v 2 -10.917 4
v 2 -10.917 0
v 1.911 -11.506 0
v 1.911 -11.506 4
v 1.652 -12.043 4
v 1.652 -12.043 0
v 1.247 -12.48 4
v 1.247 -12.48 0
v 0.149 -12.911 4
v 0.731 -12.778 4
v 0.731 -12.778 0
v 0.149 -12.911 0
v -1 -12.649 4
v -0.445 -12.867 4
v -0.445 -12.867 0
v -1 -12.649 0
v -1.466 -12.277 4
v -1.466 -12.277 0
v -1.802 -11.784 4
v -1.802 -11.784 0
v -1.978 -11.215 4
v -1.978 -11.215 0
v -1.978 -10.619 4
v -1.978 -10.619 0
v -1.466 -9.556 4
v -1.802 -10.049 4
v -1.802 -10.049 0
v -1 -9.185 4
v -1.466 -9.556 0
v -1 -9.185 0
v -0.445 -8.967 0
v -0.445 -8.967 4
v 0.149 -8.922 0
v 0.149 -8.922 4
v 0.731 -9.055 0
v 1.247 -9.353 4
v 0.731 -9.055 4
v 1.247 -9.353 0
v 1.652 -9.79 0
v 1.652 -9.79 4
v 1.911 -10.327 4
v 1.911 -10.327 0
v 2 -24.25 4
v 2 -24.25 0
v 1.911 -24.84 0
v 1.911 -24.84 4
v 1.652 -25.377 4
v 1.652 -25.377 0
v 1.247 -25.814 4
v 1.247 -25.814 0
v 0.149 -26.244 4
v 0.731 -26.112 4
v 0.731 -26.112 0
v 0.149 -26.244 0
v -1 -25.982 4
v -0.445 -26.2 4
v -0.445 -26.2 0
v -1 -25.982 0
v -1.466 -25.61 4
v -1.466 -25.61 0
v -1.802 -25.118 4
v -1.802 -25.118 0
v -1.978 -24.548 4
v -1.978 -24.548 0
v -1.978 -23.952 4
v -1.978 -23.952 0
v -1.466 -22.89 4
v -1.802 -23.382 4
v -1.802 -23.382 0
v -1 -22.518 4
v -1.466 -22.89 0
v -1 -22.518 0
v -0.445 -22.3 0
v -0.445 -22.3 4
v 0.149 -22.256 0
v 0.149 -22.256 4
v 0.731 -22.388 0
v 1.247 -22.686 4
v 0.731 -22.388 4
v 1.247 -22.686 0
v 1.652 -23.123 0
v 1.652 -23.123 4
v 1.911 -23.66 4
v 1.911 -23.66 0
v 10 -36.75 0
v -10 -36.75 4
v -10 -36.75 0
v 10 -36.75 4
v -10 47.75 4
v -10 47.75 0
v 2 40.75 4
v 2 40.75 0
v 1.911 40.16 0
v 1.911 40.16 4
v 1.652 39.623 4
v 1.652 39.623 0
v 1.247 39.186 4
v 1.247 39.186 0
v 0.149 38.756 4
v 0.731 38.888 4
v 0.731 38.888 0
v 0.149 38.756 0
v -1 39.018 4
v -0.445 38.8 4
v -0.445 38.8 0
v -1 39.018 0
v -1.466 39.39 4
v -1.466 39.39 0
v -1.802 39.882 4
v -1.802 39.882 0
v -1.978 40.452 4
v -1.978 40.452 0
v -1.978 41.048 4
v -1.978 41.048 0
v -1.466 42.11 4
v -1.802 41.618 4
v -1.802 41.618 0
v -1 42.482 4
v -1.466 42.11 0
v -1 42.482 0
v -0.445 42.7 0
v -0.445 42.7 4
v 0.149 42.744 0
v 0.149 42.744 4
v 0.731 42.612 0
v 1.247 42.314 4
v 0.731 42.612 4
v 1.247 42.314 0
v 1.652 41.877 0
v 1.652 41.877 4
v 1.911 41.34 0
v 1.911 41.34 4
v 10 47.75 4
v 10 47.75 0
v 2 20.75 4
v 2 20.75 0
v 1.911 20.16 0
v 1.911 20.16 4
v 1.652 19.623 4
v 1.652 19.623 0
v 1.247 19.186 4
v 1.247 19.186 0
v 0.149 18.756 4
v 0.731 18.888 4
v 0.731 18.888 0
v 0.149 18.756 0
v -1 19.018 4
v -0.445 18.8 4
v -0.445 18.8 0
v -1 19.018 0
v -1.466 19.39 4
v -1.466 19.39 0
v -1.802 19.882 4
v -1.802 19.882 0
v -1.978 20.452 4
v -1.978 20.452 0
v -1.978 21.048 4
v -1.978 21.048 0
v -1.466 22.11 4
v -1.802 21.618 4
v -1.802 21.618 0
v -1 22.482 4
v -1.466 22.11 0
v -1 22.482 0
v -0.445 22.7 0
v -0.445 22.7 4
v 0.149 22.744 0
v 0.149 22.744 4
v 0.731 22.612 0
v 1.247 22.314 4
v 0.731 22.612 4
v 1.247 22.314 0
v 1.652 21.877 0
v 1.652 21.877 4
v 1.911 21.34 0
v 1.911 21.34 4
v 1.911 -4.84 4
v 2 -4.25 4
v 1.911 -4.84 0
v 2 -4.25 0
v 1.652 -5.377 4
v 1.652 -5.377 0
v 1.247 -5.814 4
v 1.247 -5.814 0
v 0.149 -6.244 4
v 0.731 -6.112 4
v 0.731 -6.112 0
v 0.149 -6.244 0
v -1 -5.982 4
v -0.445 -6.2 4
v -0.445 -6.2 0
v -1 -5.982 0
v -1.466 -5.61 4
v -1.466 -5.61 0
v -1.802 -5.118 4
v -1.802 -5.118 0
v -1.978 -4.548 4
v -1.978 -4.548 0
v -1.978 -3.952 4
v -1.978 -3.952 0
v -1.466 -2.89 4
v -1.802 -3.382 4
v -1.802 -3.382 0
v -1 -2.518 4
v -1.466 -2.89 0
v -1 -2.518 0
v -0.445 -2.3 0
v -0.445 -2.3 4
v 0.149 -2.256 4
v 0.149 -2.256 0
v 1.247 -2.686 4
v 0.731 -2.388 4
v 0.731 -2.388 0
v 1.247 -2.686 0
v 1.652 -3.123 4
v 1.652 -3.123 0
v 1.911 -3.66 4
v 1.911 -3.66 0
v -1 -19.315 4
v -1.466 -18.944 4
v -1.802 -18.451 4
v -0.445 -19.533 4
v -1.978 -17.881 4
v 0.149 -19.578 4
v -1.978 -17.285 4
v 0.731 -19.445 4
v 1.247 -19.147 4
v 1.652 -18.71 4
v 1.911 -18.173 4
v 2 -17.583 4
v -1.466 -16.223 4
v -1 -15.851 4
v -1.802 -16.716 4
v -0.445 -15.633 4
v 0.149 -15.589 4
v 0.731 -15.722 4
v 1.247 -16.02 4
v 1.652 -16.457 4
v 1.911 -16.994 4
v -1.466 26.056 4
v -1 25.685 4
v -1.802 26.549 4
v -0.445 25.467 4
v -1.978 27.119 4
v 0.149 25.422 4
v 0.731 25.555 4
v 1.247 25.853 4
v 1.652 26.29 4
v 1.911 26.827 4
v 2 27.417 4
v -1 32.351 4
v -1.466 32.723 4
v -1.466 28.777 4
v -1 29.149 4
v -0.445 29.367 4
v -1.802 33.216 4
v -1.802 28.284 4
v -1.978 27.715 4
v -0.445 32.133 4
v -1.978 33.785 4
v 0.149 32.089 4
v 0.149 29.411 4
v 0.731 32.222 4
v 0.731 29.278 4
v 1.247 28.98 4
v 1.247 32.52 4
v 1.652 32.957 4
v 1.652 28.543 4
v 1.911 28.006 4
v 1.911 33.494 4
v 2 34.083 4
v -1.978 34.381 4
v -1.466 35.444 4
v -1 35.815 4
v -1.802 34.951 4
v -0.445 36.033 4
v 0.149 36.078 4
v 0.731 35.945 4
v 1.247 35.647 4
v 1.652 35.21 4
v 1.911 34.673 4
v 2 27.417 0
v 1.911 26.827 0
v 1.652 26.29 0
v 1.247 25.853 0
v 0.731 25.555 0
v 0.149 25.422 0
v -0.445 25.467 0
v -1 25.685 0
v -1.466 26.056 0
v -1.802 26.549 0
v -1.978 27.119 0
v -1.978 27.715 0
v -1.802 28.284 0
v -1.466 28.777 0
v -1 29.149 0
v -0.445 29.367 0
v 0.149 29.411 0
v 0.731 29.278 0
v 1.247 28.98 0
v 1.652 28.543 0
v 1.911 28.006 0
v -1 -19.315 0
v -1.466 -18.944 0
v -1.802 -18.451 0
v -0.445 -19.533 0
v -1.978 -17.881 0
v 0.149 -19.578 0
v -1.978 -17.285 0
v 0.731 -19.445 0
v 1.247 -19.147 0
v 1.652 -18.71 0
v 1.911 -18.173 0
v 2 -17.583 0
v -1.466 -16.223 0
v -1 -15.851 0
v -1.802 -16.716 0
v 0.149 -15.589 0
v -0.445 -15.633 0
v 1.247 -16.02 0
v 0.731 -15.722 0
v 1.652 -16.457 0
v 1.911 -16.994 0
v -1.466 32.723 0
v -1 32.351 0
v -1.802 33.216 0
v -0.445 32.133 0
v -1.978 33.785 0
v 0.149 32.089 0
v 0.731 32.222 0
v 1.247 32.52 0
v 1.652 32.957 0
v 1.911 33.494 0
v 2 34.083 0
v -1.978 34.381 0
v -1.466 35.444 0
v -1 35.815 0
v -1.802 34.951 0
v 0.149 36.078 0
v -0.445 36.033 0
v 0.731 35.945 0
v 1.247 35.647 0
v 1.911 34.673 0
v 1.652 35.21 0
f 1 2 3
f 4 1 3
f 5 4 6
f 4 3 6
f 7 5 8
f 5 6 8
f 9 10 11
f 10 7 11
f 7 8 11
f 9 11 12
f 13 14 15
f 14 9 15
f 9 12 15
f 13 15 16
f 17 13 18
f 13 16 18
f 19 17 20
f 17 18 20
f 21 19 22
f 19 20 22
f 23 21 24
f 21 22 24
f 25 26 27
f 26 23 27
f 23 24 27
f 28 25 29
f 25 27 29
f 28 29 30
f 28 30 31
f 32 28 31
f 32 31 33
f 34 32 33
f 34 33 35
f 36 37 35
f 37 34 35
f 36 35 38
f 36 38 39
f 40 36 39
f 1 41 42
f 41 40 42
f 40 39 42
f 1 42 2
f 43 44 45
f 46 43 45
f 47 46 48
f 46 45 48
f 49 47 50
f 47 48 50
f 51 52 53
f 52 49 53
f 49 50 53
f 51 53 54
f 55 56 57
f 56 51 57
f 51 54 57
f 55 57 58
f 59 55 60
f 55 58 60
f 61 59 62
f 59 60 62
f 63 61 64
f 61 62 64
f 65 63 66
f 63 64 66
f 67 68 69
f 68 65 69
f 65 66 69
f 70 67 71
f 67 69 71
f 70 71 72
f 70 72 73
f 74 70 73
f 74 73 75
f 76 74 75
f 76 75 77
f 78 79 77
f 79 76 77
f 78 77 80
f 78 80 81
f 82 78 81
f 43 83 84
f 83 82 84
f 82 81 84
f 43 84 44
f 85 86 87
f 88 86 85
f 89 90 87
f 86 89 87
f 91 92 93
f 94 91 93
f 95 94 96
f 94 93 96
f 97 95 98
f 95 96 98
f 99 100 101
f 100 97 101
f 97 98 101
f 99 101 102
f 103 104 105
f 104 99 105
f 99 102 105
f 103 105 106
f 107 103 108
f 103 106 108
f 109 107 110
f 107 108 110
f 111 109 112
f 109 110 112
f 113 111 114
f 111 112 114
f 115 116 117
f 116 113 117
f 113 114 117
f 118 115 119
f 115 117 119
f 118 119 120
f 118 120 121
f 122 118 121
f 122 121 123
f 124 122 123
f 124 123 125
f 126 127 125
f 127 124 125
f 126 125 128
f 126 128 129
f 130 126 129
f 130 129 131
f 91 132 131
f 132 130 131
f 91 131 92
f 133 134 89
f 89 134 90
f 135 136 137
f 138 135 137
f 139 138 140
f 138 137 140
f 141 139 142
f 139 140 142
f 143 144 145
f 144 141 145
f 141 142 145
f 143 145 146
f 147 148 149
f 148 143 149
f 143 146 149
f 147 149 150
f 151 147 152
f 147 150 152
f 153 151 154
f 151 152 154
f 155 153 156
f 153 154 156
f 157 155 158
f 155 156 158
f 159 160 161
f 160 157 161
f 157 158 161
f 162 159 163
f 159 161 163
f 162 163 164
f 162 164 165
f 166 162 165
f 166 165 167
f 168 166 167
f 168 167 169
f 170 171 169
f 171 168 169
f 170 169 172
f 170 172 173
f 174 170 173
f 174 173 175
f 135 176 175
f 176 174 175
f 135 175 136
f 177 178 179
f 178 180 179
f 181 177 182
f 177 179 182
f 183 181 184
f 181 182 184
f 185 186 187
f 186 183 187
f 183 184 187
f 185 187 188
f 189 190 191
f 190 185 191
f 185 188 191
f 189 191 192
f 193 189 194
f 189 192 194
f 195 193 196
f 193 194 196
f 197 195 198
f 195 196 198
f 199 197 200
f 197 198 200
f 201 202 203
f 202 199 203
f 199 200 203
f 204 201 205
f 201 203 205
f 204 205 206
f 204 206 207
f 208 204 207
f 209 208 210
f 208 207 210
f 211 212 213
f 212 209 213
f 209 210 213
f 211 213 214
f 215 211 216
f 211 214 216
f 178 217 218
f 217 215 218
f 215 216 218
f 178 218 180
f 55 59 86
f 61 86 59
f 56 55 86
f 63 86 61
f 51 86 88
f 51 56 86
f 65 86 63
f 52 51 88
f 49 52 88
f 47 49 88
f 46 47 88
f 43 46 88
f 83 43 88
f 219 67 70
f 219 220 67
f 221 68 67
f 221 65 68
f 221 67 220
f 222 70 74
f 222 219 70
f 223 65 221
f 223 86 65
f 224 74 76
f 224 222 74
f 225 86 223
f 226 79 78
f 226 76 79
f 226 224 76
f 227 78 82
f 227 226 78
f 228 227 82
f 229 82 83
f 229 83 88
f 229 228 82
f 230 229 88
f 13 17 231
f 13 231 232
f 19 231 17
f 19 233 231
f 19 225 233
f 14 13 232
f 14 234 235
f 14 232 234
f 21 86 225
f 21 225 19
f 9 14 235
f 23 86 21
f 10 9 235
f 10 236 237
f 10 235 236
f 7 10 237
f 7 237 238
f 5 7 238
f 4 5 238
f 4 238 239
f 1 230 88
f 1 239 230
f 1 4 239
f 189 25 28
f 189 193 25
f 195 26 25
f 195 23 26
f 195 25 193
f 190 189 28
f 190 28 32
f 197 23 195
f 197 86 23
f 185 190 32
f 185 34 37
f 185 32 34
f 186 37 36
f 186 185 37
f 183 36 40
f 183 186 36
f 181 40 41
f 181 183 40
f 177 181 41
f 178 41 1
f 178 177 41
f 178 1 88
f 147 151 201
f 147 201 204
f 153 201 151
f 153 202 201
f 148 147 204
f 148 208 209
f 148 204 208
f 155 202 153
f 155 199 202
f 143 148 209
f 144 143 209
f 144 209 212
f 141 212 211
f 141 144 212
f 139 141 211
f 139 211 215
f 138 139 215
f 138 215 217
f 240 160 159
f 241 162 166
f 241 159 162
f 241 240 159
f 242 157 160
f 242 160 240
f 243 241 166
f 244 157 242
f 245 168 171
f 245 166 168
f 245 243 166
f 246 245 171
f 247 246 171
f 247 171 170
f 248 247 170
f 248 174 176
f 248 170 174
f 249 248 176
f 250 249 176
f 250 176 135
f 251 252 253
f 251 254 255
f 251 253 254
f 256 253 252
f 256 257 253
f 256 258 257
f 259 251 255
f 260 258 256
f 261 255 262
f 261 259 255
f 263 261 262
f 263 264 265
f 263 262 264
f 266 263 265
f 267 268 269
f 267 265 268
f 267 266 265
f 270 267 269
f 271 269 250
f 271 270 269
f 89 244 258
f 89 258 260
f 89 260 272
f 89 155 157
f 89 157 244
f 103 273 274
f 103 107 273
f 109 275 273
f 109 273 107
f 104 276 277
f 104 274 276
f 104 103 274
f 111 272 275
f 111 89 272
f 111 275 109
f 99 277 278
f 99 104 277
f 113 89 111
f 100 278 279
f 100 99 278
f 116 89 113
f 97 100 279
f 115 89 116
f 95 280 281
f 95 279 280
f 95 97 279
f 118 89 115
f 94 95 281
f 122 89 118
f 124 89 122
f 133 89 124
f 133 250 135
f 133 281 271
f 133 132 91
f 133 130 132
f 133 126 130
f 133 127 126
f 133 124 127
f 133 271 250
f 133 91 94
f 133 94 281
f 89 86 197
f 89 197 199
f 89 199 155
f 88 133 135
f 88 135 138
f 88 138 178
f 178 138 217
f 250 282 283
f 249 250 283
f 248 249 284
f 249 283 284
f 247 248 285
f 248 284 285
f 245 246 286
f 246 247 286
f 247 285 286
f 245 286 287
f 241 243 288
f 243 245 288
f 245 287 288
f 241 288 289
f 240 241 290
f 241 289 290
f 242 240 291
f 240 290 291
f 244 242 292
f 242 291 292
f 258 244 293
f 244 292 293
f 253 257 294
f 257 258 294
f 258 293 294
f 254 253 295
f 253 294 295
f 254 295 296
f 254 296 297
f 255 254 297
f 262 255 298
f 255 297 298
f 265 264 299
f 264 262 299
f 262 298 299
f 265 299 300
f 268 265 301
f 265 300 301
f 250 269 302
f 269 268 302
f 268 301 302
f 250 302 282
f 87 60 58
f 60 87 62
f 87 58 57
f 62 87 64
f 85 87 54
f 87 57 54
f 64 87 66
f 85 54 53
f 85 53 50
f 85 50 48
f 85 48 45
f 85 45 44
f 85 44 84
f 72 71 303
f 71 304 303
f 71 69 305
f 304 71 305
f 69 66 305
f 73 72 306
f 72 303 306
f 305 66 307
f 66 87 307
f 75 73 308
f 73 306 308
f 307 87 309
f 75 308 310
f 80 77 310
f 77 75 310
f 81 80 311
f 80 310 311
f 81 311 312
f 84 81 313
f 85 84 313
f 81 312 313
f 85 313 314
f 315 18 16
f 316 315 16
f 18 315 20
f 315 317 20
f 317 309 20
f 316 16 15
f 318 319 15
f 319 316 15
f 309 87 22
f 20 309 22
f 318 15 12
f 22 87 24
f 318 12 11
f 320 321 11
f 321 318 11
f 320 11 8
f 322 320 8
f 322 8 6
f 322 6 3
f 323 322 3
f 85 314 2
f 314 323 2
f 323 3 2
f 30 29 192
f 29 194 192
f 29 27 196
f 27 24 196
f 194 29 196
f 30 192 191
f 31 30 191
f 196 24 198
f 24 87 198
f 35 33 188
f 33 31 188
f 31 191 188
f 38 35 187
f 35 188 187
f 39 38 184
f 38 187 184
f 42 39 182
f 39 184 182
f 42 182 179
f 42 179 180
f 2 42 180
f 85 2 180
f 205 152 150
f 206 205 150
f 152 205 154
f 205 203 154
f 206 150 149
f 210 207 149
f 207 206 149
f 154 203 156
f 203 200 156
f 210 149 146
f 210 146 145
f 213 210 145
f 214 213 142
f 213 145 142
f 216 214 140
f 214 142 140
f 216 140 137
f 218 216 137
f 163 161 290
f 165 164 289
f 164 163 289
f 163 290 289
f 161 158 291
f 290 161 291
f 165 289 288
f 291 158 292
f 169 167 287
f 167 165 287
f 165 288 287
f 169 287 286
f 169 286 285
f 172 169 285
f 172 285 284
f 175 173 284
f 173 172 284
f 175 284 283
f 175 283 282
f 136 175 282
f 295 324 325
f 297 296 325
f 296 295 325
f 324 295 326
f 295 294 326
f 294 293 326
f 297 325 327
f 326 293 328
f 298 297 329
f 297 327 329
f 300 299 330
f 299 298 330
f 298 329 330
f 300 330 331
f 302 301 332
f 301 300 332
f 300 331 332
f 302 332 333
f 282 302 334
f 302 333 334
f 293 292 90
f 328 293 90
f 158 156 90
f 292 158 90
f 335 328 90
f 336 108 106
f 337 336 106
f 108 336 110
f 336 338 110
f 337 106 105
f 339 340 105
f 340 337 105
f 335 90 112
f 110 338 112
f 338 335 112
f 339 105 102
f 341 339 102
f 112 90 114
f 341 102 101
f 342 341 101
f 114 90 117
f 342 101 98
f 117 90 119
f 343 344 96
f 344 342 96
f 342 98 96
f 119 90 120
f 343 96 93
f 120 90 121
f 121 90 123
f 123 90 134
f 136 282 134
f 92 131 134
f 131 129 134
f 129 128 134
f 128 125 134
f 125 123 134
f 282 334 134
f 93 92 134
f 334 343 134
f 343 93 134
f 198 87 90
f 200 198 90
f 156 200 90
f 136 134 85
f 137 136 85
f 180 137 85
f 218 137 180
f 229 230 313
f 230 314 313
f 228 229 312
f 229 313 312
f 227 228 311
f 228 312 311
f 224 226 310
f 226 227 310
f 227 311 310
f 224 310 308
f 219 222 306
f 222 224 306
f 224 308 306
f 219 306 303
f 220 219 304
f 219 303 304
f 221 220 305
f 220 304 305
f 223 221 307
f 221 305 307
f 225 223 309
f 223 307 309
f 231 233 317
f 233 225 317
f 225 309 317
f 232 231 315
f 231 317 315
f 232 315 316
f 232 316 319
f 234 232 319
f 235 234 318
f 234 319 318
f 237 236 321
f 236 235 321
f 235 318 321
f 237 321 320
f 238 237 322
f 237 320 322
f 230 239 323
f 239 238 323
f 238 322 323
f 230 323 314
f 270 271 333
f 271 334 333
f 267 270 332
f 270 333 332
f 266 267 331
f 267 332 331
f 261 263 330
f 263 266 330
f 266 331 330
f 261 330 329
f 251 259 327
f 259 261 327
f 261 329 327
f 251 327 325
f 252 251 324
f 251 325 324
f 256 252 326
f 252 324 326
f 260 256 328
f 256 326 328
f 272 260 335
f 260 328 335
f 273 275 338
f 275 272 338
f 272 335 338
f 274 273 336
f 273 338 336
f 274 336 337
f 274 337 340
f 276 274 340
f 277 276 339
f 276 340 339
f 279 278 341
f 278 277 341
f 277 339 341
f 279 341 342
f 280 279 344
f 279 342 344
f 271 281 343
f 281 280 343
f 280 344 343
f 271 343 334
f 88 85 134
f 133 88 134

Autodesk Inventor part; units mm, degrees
ref_plane "YZ Plane" through (0, 0, 0) normal (1, 0, 0) x (0, 1, 0)
ref_plane "XZ Plane" through (0, 0, 0) normal (0, 1, 0) x (-1, 0, 0)
ref_plane "XY Plane" through (0, 0, 0) normal (0, 0, 1) x (1, 0, 0)
sketch "Sketch1" plane through (0, 0, 0) normal (0, 0, 1) x (1, 0, 0)
  circle A0 centre (0, -30.375) radius 0.875
  line L0 (10, -63.625) -> (10, 47.75)
  line L1 (10, 47.75) -> (-10, 47.75)
  line L2 (-10, 47.75) -> (-10, -63.625)
  line L3 (-10, -63.625) -> (10, -63.625)
  line L4 (6.125, -36.75) -> (6.125, -59.75)
  line L5 (6.125, -59.75) -> (-6.125, -59.75)
  line L6 (-6.125, -59.75) -> (-6.125, -36.75)
  line L7 (-6.125, -36.75) -> (6.125, -36.75)
  circle A1 centre (0, 40.75) radius 2
  circle A2 centre (0, -4.25) radius 2
  circle A3 centre (0, 20.75) radius 2
  circle A4 centre (0, -24.25) radius 2
  circle A5 centre (0, 34.0833) radius 2
  circle A6 centre (0, 27.4167) radius 2
  circle A7 centre (0, -10.9167) radius 2
  circle A8 centre (0, -17.5833) radius 2
  point P0 (0, 0)
  point P1 (0, 0)
extrude "Extrusion1" add sketch "Sketch1" along normal blind 4
sketch "Sketch2" plane through (0, 0, 4) normal (0, 0, 1) x (1, 0, 0)
  line L0 (6.125, -59.75) -> (-6.125, -59.75) projected
  line L1 (-6.125, -59.75) -> (-6.125, -36.75) projected
  line L2 (-6.125, -36.75) -> (6.125, -36.75) projected
  line L3 (6.125, -36.75) -> (6.125, -59.75) projected
  circle A0 centre (0, -17.5833) radius 2 projected
  circle A1 centre (0, -10.9167) radius 2 projected
  circle A2 centre (0, 27.4167) radius 2 projected
  circle A3 centre (0, 34.0833) radius 2 projected
  circle A4 centre (0, -24.25) radius 2 projected
  circle A5 centre (0, 20.75) radius 2 projected
  circle A6 centre (0, -4.25) radius 2 projected
  circle A7 centre (0, 40.75) radius 2 projected
  circle A8 centre (0, -30.375) radius 0.875 projected
  line L4 (10, -63.625) -> (10, 47.75) projected
  line L5 (10, 47.75) -> (-10, 47.75) projected
  line L6 (-10, 47.75) -> (-10, -63.625) projected
  line L7 (-10, -63.625) -> (10, -63.625) projected
  line L8 (-10, -36.75) -> (10, -36.75)
  point P0 (0, 0)
extrude "Extrusion2" cut sketch "Sketch2" against normal blind 4 contours L3 L8 L4 L7 L6 L1 L0
sketch "Sketch3" plane through (0, 0, 4) normal (0, 0, 1) x (1, 0, 0)
  line L0 (-10, -36.75) -> (10, -36.75) projected
  line L1 (10, -36.75) -> (10, 47.75) projected
  line L2 (10, 47.75) -> (-10, 47.75) projected
  line L3 (-10, 47.75) -> (-10, -36.75) projected
  circle A0 centre (0, -30.375) radius 0.875 projected
  circle A1 centre (0, 40.75) radius 2 projected
  circle A2 centre (0, -4.25) radius 2 projected
  circle A3 centre (0, 20.75) radius 2 projected
  circle A4 centre (0, -24.25) radius 2 projected
  circle A5 centre (0, 34.0833) radius 2 projected
  circle A6 centre (0, 27.4167) radius 2 projected
  circle A7 centre (0, -10.9167) radius 2 projected
  circle A8 centre (0, -17.5833) radius 2 projected
  point P0 (0, 0)
extrude "Extrusion3" add sketch "Sketch3" against normal blind 4 contours A0
sketch "Sketch4" plane through (0, 0, 4) normal (0, 0, 1) x (1, 0, 0)
  line L0 (-10, -36.75) -> (10, -36.75) projected
  line L1 (10, -36.75) -> (10, 47.75) projected
  line L2 (10, 47.75) -> (-10, 47.75) projected
  line L3 (-10, 47.75) -> (-10, -36.75) projected
  circle A0 centre (0, 40.75) radius 2 projected
  circle A1 centre (0, -4.25) radius 2 projected
  circle A2 centre (0, 20.75) radius 2 projected
  circle A3 centre (0, -24.25) radius 2 projected
  circle A4 centre (0, 34.0833) radius 2 projected
  circle A5 centre (0, 27.4167) radius 2 projected
  circle A6 centre (0, -10.9167) radius 2 projected
  circle A7 centre (0, -17.5833) radius 2 projected
  line L4 (-33.7924, 18.25) -> (39.8102, 18.25) construction
  point P0 (0, 0)
  dimension "d6" = 22.5
properties part number "BottomRearLeg"
